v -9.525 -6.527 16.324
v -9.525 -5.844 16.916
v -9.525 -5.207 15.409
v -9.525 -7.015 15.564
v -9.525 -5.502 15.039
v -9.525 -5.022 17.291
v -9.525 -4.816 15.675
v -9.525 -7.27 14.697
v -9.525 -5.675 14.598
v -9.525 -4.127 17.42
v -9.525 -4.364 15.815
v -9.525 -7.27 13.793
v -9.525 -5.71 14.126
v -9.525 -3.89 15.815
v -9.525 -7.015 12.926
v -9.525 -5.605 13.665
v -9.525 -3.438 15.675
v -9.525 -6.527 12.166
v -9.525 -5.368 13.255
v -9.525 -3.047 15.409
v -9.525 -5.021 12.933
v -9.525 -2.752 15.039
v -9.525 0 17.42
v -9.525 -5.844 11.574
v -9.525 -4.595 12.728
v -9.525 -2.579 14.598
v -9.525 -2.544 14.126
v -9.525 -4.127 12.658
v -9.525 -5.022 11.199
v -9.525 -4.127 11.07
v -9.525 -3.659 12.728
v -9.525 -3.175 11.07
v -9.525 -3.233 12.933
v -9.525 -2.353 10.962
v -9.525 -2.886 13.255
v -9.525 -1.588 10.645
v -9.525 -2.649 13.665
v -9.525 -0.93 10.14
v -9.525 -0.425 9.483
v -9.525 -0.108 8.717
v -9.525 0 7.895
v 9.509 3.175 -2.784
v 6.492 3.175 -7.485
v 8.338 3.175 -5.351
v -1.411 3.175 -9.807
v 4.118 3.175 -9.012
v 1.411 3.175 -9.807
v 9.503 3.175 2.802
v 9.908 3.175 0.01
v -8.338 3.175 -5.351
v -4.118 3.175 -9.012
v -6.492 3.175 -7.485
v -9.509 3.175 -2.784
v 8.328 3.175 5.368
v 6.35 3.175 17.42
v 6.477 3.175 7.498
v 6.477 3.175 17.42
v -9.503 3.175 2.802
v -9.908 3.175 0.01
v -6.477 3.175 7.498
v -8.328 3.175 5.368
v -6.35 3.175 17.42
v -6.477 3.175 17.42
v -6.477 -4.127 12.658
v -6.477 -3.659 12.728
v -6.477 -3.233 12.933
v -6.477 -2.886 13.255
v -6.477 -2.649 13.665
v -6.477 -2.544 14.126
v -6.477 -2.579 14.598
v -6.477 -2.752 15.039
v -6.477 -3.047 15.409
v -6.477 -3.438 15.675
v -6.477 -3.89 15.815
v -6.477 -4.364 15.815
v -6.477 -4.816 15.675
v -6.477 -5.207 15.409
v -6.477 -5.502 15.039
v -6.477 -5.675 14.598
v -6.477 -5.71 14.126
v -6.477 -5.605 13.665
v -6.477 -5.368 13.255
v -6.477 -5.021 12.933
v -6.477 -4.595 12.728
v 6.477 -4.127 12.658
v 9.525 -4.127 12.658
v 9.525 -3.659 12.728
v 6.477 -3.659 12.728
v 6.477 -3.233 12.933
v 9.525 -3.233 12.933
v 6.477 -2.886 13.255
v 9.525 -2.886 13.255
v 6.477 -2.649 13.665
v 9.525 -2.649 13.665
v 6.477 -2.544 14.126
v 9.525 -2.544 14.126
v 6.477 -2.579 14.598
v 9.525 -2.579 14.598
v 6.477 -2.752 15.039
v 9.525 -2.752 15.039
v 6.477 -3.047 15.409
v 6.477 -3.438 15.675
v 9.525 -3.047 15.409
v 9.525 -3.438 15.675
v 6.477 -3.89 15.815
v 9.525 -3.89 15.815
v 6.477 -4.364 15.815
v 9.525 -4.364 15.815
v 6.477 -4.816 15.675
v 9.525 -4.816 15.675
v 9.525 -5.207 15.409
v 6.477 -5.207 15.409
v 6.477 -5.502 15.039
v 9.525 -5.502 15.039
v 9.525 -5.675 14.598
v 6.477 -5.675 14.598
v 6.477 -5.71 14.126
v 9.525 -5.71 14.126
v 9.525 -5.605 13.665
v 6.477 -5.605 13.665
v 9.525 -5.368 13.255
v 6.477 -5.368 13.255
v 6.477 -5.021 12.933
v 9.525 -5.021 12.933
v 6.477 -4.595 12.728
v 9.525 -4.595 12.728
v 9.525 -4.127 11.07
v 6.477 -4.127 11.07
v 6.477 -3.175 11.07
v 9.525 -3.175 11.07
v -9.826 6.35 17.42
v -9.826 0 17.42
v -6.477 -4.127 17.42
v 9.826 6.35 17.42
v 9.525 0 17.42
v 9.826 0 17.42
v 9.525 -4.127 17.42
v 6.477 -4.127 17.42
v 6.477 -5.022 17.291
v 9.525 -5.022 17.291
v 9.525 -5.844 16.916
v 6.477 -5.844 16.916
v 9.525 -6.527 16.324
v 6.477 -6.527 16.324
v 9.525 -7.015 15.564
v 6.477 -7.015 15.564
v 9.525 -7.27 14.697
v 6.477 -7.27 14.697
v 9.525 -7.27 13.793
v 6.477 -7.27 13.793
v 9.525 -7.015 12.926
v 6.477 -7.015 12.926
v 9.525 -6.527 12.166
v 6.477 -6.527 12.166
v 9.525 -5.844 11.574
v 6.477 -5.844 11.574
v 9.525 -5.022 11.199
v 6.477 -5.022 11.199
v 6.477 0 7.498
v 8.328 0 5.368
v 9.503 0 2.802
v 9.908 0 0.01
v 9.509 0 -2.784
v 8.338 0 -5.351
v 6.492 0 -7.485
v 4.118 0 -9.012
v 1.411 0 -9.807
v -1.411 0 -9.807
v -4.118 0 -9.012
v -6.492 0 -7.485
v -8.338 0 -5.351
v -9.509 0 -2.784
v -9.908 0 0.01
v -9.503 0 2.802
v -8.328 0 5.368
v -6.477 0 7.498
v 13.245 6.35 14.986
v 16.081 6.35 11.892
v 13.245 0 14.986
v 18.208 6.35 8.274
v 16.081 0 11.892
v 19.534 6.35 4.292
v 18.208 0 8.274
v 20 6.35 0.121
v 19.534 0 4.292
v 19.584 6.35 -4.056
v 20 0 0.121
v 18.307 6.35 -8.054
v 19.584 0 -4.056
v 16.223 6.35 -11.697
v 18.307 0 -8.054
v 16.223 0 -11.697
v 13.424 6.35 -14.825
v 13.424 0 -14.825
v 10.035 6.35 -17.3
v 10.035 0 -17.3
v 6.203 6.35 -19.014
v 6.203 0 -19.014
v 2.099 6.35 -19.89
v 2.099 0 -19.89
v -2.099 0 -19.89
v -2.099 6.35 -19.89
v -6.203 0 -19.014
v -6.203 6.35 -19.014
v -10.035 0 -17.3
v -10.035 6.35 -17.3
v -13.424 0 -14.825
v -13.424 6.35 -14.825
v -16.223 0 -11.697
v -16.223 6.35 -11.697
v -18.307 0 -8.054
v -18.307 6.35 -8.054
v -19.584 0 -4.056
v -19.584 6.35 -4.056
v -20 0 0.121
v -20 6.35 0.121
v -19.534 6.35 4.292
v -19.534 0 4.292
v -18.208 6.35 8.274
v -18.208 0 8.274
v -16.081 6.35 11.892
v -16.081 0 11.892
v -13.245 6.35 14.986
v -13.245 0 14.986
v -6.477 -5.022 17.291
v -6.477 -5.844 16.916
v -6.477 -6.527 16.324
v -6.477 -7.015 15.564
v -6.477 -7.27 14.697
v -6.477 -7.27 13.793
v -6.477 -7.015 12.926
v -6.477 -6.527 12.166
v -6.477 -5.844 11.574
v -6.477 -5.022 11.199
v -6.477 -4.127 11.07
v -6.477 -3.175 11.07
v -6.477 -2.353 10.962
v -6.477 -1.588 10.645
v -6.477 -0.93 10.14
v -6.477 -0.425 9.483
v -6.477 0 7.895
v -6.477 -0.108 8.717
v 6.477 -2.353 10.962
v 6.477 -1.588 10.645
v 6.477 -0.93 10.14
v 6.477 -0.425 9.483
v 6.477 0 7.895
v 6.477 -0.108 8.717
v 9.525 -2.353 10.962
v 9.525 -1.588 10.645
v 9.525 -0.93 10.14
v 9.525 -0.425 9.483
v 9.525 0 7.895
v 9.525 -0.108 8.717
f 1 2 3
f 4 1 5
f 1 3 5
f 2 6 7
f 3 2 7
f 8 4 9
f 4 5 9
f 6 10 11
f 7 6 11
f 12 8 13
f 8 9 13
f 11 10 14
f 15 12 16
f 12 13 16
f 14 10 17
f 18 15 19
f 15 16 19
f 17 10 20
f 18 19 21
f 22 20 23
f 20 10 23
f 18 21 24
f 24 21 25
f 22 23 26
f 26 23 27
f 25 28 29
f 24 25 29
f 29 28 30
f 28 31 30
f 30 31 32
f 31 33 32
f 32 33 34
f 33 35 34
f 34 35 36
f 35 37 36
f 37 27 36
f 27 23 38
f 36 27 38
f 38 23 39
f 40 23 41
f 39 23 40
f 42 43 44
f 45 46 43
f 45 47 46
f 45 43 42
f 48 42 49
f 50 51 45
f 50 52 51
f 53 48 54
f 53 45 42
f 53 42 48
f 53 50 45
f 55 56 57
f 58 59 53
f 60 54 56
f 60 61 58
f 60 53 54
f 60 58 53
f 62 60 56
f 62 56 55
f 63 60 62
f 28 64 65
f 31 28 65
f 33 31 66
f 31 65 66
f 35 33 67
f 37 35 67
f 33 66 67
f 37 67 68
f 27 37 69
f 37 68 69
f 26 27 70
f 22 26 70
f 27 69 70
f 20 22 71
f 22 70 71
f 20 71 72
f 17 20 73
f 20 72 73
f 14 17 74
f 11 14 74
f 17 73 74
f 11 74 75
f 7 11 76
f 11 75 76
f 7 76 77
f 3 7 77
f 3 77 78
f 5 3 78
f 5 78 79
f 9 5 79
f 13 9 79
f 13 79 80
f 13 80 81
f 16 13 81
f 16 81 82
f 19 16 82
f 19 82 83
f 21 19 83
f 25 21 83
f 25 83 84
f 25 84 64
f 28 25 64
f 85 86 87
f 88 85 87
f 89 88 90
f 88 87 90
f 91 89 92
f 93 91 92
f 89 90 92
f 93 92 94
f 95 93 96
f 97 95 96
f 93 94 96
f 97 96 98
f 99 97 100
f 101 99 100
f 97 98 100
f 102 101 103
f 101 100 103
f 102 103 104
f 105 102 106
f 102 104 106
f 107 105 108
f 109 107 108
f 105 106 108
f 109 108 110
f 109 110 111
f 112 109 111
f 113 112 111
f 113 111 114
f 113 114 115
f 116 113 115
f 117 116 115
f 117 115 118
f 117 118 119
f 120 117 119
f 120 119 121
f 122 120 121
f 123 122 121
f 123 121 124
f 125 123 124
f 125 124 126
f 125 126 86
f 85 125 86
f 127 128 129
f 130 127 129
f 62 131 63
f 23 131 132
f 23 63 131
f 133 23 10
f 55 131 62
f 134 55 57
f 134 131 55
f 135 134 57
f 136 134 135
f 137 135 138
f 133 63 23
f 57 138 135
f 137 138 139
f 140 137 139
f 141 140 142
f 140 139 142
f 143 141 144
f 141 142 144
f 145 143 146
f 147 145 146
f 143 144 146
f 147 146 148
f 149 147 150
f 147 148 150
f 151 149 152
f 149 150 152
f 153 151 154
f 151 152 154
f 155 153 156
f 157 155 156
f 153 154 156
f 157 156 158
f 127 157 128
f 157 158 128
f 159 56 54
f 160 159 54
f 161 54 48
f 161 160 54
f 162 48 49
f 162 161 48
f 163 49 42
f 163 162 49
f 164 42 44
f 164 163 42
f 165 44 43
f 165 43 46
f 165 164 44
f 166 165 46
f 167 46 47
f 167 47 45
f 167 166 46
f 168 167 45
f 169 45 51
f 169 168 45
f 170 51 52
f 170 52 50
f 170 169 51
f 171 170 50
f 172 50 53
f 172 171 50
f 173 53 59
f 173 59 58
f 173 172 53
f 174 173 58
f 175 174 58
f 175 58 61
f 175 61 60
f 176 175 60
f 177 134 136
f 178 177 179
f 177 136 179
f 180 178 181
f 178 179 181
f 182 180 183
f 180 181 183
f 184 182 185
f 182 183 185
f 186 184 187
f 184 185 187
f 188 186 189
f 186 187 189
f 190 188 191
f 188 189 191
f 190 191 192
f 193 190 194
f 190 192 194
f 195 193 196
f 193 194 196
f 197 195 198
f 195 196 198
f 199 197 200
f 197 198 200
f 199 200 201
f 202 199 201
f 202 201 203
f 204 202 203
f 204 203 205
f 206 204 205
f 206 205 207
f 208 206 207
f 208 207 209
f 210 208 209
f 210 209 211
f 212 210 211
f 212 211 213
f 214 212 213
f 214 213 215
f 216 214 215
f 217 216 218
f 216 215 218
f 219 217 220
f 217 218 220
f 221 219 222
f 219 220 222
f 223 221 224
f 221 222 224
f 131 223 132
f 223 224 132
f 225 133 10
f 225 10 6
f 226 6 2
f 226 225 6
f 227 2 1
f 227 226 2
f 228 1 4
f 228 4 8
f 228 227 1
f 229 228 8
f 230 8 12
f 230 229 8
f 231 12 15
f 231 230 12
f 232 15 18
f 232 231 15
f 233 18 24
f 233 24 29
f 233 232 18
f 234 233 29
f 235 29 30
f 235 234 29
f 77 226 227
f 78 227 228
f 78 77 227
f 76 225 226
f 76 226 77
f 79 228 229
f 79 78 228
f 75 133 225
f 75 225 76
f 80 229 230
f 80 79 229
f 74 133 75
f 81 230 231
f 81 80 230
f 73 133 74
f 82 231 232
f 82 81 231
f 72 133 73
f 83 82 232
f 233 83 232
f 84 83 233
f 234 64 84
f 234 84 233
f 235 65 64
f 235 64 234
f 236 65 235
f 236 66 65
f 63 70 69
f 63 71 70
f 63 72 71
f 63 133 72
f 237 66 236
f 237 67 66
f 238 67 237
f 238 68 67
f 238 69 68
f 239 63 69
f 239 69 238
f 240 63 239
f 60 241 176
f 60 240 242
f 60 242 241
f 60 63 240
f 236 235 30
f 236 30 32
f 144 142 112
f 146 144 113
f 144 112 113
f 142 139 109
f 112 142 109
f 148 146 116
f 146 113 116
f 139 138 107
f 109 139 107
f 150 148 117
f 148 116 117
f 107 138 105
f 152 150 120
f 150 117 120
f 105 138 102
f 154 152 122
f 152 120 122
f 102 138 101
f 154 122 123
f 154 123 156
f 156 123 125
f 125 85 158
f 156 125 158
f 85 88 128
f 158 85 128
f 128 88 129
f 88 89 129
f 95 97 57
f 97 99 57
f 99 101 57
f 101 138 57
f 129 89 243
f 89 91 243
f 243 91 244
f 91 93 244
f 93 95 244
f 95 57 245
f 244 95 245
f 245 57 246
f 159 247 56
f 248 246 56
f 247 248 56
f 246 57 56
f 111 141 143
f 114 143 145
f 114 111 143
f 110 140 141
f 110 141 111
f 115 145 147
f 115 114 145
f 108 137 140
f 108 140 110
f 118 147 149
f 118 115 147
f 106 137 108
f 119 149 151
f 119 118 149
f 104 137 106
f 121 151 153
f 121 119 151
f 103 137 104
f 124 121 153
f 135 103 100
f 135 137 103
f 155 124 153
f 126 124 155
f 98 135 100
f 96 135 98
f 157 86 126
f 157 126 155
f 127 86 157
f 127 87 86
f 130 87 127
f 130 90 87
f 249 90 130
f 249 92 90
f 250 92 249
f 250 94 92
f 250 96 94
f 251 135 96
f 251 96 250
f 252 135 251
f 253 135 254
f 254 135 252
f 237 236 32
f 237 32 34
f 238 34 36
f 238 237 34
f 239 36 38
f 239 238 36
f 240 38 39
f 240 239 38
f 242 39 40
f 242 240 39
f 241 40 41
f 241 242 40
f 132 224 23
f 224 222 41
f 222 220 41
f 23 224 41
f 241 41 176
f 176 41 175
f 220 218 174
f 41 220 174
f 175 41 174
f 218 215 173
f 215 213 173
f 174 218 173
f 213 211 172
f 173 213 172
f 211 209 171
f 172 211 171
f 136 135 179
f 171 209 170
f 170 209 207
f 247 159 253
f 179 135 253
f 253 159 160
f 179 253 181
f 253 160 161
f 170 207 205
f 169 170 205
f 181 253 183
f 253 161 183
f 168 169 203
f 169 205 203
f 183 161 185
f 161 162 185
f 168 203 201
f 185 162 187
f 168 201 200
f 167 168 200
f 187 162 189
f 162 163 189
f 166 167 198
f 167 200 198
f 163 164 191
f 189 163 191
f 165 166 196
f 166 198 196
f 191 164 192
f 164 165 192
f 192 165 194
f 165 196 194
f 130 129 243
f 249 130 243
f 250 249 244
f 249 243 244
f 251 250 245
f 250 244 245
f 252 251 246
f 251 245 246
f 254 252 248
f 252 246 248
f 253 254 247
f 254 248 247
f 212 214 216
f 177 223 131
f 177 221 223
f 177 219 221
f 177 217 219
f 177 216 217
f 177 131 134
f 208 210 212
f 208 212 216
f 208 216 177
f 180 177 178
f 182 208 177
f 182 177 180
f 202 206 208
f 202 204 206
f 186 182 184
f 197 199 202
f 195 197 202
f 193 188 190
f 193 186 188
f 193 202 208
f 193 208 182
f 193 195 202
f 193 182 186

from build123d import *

# Parameters (mm, degrees)
SKETCH1_R               = 20.000000005
BOSS_EXTRUDE1_DEPTH     = 6.35
BOSS_EXTRUDE2_DEPTH     = 3.175
SKETCH3_R               = 1.5875
CUT_EXTRUDE1_DEPTH      = 30.525000005
CUT_EXTRUDE2_DEPTH      = 3.175
SKETCH6_W               = 9.069473667
SKETCH6_H               = 11.755238044
CUT_EXTRUDE3_DEPTH      = 14.650000005
CUT_EXTRUDE3_DEPTH_BACK = 27.350000005
CUT_EXTRUDE4_DEPTH      = 6.477
CUT_EXTRUDE4_DEPTH_BACK = 6.477


with BuildPart() as part:
    # Sketch1 → Boss-Extrude1 (new body)
    with BuildSketch(Plane(origin=(0, 0, 0), x_dir=(1, 0, 0), z_dir=(0, 1, 0))):
        Circle(SKETCH1_R)
    extrude(amount=BOSS_EXTRUDE1_DEPTH)

    # Sketch2 → Boss-Extrude2 (add)
    with BuildSketch(Plane(origin=(6.35, 0, 0), x_dir=(0, 0, -1), z_dir=(1, 0, 0))):
        with BuildLine():
            Line((-17.420082718, 0), (-17.420082718, -4.127))
            ThreePointArc((-17.420082718, -4.127), (-14.245082718, -7.302), (-11.070082718, -4.127))
            Line((-11.070082718, -4.127), (-11.070082718, -3.175))
            ThreePointArc((-11.070082718, -3.175), (-10.140146748, -0.92993597), (-7.895082718, 0))
            Line((-7.895082718, 0), (-5.849160659, 0))
            Line((-5.849160659, 0), (-5.849160659, 6.35))
            Line((-5.849160659, 6.35), (-11.070082718, 6.35))
            ThreePointArc((-11.070082718, 6.35), (-15.560210778, 4.490128061), (-17.420082718, 0))
        make_face()
    boss_extrude2 = extrude(amount=BOSS_EXTRUDE2_DEPTH)

    # Mirror1: Boss-Extrude2 across plane
    add(boss_extrude2.mirror(Plane(origin=(0, 0, 0), x_dir=(0, 0, 1), z_dir=(1, 0, 0))))

    # Sketch3 → Cut-Extrude1 (cut, through all)
    with BuildSketch(Plane(origin=(9.525, 0, 0), x_dir=(0, 0, -1), z_dir=(1, 0, 0))):
        with Locations((-14.245082718, -4.127)):
            Circle(SKETCH3_R)
    extrude(amount=-CUT_EXTRUDE1_DEPTH, mode=Mode.SUBTRACT)

    # Sketch5 → Cut-Extrude2 (cut)
    with BuildSketch(Plane.XZ):
        with BuildLine():
            Line((6.35, 18.965165441), (6.35, 7.605609073))
            ThreePointArc((6.35, 7.605609073), (0, -9.907965955), (-6.35, 7.605609073))
            Line((-6.35, 7.605609073), (-6.35, 18.965165441))
            ThreePointArc((-6.35, 18.965165441), (0, 20.000000005), (6.35, 18.965165441))
        make_face()
    extrude(amount=-CUT_EXTRUDE2_DEPTH, mode=Mode.SUBTRACT)

    # Sketch6 → Cut-Extrude3 (cut, two sides)
    with BuildSketch(Plane(origin=(6.35, 0, 0), x_dir=(0, 0, -1), z_dir=(1, 0, 0))) as cut_extrude3_sk:
        with Locations((-21.954819552, 5.877619022)):
            Rectangle(SKETCH6_W, SKETCH6_H)
    extrude(amount=CUT_EXTRUDE3_DEPTH, mode=Mode.SUBTRACT)
    extrude(cut_extrude3_sk.sketch, amount=-CUT_EXTRUDE3_DEPTH_BACK, mode=Mode.SUBTRACT)

    # Sketch7 → Cut-Extrude4 (cut, two sides)
    with BuildSketch(Plane(origin=(0, 0, 0), x_dir=(0, 0, -1), z_dir=(1, 0, 0))) as cut_extrude4_sk:
        with BuildLine():
            Line((-6.646914412, 0), (-6.646914412, 3.175))
            Line((-6.646914412, 3.175), (-7.605609073, 3.175))
            Line((-7.605609073, 3.175), (-17.420082718, 3.175))
            Line((-17.420082718, 3.175), (-17.420082718, -4.127))
            ThreePointArc((-17.420082718, -4.127), (-14.245082718, -7.302), (-11.070082718, -4.127))
            Line((-11.070082718, -4.127), (-11.070082718, -3.175))
            ThreePointArc((-11.070082718, -3.175), (-10.140146748, -0.92993597), (-7.895082718, 0))
            Line((-7.895082718, 0), (-6.646914412, 0))
        make_face()
    extrude(amount=CUT_EXTRUDE4_DEPTH, mode=Mode.SUBTRACT)
    extrude(cut_extrude4_sk.sketch, amount=-CUT_EXTRUDE4_DEPTH_BACK, mode=Mode.SUBTRACT)


solid = part.part
